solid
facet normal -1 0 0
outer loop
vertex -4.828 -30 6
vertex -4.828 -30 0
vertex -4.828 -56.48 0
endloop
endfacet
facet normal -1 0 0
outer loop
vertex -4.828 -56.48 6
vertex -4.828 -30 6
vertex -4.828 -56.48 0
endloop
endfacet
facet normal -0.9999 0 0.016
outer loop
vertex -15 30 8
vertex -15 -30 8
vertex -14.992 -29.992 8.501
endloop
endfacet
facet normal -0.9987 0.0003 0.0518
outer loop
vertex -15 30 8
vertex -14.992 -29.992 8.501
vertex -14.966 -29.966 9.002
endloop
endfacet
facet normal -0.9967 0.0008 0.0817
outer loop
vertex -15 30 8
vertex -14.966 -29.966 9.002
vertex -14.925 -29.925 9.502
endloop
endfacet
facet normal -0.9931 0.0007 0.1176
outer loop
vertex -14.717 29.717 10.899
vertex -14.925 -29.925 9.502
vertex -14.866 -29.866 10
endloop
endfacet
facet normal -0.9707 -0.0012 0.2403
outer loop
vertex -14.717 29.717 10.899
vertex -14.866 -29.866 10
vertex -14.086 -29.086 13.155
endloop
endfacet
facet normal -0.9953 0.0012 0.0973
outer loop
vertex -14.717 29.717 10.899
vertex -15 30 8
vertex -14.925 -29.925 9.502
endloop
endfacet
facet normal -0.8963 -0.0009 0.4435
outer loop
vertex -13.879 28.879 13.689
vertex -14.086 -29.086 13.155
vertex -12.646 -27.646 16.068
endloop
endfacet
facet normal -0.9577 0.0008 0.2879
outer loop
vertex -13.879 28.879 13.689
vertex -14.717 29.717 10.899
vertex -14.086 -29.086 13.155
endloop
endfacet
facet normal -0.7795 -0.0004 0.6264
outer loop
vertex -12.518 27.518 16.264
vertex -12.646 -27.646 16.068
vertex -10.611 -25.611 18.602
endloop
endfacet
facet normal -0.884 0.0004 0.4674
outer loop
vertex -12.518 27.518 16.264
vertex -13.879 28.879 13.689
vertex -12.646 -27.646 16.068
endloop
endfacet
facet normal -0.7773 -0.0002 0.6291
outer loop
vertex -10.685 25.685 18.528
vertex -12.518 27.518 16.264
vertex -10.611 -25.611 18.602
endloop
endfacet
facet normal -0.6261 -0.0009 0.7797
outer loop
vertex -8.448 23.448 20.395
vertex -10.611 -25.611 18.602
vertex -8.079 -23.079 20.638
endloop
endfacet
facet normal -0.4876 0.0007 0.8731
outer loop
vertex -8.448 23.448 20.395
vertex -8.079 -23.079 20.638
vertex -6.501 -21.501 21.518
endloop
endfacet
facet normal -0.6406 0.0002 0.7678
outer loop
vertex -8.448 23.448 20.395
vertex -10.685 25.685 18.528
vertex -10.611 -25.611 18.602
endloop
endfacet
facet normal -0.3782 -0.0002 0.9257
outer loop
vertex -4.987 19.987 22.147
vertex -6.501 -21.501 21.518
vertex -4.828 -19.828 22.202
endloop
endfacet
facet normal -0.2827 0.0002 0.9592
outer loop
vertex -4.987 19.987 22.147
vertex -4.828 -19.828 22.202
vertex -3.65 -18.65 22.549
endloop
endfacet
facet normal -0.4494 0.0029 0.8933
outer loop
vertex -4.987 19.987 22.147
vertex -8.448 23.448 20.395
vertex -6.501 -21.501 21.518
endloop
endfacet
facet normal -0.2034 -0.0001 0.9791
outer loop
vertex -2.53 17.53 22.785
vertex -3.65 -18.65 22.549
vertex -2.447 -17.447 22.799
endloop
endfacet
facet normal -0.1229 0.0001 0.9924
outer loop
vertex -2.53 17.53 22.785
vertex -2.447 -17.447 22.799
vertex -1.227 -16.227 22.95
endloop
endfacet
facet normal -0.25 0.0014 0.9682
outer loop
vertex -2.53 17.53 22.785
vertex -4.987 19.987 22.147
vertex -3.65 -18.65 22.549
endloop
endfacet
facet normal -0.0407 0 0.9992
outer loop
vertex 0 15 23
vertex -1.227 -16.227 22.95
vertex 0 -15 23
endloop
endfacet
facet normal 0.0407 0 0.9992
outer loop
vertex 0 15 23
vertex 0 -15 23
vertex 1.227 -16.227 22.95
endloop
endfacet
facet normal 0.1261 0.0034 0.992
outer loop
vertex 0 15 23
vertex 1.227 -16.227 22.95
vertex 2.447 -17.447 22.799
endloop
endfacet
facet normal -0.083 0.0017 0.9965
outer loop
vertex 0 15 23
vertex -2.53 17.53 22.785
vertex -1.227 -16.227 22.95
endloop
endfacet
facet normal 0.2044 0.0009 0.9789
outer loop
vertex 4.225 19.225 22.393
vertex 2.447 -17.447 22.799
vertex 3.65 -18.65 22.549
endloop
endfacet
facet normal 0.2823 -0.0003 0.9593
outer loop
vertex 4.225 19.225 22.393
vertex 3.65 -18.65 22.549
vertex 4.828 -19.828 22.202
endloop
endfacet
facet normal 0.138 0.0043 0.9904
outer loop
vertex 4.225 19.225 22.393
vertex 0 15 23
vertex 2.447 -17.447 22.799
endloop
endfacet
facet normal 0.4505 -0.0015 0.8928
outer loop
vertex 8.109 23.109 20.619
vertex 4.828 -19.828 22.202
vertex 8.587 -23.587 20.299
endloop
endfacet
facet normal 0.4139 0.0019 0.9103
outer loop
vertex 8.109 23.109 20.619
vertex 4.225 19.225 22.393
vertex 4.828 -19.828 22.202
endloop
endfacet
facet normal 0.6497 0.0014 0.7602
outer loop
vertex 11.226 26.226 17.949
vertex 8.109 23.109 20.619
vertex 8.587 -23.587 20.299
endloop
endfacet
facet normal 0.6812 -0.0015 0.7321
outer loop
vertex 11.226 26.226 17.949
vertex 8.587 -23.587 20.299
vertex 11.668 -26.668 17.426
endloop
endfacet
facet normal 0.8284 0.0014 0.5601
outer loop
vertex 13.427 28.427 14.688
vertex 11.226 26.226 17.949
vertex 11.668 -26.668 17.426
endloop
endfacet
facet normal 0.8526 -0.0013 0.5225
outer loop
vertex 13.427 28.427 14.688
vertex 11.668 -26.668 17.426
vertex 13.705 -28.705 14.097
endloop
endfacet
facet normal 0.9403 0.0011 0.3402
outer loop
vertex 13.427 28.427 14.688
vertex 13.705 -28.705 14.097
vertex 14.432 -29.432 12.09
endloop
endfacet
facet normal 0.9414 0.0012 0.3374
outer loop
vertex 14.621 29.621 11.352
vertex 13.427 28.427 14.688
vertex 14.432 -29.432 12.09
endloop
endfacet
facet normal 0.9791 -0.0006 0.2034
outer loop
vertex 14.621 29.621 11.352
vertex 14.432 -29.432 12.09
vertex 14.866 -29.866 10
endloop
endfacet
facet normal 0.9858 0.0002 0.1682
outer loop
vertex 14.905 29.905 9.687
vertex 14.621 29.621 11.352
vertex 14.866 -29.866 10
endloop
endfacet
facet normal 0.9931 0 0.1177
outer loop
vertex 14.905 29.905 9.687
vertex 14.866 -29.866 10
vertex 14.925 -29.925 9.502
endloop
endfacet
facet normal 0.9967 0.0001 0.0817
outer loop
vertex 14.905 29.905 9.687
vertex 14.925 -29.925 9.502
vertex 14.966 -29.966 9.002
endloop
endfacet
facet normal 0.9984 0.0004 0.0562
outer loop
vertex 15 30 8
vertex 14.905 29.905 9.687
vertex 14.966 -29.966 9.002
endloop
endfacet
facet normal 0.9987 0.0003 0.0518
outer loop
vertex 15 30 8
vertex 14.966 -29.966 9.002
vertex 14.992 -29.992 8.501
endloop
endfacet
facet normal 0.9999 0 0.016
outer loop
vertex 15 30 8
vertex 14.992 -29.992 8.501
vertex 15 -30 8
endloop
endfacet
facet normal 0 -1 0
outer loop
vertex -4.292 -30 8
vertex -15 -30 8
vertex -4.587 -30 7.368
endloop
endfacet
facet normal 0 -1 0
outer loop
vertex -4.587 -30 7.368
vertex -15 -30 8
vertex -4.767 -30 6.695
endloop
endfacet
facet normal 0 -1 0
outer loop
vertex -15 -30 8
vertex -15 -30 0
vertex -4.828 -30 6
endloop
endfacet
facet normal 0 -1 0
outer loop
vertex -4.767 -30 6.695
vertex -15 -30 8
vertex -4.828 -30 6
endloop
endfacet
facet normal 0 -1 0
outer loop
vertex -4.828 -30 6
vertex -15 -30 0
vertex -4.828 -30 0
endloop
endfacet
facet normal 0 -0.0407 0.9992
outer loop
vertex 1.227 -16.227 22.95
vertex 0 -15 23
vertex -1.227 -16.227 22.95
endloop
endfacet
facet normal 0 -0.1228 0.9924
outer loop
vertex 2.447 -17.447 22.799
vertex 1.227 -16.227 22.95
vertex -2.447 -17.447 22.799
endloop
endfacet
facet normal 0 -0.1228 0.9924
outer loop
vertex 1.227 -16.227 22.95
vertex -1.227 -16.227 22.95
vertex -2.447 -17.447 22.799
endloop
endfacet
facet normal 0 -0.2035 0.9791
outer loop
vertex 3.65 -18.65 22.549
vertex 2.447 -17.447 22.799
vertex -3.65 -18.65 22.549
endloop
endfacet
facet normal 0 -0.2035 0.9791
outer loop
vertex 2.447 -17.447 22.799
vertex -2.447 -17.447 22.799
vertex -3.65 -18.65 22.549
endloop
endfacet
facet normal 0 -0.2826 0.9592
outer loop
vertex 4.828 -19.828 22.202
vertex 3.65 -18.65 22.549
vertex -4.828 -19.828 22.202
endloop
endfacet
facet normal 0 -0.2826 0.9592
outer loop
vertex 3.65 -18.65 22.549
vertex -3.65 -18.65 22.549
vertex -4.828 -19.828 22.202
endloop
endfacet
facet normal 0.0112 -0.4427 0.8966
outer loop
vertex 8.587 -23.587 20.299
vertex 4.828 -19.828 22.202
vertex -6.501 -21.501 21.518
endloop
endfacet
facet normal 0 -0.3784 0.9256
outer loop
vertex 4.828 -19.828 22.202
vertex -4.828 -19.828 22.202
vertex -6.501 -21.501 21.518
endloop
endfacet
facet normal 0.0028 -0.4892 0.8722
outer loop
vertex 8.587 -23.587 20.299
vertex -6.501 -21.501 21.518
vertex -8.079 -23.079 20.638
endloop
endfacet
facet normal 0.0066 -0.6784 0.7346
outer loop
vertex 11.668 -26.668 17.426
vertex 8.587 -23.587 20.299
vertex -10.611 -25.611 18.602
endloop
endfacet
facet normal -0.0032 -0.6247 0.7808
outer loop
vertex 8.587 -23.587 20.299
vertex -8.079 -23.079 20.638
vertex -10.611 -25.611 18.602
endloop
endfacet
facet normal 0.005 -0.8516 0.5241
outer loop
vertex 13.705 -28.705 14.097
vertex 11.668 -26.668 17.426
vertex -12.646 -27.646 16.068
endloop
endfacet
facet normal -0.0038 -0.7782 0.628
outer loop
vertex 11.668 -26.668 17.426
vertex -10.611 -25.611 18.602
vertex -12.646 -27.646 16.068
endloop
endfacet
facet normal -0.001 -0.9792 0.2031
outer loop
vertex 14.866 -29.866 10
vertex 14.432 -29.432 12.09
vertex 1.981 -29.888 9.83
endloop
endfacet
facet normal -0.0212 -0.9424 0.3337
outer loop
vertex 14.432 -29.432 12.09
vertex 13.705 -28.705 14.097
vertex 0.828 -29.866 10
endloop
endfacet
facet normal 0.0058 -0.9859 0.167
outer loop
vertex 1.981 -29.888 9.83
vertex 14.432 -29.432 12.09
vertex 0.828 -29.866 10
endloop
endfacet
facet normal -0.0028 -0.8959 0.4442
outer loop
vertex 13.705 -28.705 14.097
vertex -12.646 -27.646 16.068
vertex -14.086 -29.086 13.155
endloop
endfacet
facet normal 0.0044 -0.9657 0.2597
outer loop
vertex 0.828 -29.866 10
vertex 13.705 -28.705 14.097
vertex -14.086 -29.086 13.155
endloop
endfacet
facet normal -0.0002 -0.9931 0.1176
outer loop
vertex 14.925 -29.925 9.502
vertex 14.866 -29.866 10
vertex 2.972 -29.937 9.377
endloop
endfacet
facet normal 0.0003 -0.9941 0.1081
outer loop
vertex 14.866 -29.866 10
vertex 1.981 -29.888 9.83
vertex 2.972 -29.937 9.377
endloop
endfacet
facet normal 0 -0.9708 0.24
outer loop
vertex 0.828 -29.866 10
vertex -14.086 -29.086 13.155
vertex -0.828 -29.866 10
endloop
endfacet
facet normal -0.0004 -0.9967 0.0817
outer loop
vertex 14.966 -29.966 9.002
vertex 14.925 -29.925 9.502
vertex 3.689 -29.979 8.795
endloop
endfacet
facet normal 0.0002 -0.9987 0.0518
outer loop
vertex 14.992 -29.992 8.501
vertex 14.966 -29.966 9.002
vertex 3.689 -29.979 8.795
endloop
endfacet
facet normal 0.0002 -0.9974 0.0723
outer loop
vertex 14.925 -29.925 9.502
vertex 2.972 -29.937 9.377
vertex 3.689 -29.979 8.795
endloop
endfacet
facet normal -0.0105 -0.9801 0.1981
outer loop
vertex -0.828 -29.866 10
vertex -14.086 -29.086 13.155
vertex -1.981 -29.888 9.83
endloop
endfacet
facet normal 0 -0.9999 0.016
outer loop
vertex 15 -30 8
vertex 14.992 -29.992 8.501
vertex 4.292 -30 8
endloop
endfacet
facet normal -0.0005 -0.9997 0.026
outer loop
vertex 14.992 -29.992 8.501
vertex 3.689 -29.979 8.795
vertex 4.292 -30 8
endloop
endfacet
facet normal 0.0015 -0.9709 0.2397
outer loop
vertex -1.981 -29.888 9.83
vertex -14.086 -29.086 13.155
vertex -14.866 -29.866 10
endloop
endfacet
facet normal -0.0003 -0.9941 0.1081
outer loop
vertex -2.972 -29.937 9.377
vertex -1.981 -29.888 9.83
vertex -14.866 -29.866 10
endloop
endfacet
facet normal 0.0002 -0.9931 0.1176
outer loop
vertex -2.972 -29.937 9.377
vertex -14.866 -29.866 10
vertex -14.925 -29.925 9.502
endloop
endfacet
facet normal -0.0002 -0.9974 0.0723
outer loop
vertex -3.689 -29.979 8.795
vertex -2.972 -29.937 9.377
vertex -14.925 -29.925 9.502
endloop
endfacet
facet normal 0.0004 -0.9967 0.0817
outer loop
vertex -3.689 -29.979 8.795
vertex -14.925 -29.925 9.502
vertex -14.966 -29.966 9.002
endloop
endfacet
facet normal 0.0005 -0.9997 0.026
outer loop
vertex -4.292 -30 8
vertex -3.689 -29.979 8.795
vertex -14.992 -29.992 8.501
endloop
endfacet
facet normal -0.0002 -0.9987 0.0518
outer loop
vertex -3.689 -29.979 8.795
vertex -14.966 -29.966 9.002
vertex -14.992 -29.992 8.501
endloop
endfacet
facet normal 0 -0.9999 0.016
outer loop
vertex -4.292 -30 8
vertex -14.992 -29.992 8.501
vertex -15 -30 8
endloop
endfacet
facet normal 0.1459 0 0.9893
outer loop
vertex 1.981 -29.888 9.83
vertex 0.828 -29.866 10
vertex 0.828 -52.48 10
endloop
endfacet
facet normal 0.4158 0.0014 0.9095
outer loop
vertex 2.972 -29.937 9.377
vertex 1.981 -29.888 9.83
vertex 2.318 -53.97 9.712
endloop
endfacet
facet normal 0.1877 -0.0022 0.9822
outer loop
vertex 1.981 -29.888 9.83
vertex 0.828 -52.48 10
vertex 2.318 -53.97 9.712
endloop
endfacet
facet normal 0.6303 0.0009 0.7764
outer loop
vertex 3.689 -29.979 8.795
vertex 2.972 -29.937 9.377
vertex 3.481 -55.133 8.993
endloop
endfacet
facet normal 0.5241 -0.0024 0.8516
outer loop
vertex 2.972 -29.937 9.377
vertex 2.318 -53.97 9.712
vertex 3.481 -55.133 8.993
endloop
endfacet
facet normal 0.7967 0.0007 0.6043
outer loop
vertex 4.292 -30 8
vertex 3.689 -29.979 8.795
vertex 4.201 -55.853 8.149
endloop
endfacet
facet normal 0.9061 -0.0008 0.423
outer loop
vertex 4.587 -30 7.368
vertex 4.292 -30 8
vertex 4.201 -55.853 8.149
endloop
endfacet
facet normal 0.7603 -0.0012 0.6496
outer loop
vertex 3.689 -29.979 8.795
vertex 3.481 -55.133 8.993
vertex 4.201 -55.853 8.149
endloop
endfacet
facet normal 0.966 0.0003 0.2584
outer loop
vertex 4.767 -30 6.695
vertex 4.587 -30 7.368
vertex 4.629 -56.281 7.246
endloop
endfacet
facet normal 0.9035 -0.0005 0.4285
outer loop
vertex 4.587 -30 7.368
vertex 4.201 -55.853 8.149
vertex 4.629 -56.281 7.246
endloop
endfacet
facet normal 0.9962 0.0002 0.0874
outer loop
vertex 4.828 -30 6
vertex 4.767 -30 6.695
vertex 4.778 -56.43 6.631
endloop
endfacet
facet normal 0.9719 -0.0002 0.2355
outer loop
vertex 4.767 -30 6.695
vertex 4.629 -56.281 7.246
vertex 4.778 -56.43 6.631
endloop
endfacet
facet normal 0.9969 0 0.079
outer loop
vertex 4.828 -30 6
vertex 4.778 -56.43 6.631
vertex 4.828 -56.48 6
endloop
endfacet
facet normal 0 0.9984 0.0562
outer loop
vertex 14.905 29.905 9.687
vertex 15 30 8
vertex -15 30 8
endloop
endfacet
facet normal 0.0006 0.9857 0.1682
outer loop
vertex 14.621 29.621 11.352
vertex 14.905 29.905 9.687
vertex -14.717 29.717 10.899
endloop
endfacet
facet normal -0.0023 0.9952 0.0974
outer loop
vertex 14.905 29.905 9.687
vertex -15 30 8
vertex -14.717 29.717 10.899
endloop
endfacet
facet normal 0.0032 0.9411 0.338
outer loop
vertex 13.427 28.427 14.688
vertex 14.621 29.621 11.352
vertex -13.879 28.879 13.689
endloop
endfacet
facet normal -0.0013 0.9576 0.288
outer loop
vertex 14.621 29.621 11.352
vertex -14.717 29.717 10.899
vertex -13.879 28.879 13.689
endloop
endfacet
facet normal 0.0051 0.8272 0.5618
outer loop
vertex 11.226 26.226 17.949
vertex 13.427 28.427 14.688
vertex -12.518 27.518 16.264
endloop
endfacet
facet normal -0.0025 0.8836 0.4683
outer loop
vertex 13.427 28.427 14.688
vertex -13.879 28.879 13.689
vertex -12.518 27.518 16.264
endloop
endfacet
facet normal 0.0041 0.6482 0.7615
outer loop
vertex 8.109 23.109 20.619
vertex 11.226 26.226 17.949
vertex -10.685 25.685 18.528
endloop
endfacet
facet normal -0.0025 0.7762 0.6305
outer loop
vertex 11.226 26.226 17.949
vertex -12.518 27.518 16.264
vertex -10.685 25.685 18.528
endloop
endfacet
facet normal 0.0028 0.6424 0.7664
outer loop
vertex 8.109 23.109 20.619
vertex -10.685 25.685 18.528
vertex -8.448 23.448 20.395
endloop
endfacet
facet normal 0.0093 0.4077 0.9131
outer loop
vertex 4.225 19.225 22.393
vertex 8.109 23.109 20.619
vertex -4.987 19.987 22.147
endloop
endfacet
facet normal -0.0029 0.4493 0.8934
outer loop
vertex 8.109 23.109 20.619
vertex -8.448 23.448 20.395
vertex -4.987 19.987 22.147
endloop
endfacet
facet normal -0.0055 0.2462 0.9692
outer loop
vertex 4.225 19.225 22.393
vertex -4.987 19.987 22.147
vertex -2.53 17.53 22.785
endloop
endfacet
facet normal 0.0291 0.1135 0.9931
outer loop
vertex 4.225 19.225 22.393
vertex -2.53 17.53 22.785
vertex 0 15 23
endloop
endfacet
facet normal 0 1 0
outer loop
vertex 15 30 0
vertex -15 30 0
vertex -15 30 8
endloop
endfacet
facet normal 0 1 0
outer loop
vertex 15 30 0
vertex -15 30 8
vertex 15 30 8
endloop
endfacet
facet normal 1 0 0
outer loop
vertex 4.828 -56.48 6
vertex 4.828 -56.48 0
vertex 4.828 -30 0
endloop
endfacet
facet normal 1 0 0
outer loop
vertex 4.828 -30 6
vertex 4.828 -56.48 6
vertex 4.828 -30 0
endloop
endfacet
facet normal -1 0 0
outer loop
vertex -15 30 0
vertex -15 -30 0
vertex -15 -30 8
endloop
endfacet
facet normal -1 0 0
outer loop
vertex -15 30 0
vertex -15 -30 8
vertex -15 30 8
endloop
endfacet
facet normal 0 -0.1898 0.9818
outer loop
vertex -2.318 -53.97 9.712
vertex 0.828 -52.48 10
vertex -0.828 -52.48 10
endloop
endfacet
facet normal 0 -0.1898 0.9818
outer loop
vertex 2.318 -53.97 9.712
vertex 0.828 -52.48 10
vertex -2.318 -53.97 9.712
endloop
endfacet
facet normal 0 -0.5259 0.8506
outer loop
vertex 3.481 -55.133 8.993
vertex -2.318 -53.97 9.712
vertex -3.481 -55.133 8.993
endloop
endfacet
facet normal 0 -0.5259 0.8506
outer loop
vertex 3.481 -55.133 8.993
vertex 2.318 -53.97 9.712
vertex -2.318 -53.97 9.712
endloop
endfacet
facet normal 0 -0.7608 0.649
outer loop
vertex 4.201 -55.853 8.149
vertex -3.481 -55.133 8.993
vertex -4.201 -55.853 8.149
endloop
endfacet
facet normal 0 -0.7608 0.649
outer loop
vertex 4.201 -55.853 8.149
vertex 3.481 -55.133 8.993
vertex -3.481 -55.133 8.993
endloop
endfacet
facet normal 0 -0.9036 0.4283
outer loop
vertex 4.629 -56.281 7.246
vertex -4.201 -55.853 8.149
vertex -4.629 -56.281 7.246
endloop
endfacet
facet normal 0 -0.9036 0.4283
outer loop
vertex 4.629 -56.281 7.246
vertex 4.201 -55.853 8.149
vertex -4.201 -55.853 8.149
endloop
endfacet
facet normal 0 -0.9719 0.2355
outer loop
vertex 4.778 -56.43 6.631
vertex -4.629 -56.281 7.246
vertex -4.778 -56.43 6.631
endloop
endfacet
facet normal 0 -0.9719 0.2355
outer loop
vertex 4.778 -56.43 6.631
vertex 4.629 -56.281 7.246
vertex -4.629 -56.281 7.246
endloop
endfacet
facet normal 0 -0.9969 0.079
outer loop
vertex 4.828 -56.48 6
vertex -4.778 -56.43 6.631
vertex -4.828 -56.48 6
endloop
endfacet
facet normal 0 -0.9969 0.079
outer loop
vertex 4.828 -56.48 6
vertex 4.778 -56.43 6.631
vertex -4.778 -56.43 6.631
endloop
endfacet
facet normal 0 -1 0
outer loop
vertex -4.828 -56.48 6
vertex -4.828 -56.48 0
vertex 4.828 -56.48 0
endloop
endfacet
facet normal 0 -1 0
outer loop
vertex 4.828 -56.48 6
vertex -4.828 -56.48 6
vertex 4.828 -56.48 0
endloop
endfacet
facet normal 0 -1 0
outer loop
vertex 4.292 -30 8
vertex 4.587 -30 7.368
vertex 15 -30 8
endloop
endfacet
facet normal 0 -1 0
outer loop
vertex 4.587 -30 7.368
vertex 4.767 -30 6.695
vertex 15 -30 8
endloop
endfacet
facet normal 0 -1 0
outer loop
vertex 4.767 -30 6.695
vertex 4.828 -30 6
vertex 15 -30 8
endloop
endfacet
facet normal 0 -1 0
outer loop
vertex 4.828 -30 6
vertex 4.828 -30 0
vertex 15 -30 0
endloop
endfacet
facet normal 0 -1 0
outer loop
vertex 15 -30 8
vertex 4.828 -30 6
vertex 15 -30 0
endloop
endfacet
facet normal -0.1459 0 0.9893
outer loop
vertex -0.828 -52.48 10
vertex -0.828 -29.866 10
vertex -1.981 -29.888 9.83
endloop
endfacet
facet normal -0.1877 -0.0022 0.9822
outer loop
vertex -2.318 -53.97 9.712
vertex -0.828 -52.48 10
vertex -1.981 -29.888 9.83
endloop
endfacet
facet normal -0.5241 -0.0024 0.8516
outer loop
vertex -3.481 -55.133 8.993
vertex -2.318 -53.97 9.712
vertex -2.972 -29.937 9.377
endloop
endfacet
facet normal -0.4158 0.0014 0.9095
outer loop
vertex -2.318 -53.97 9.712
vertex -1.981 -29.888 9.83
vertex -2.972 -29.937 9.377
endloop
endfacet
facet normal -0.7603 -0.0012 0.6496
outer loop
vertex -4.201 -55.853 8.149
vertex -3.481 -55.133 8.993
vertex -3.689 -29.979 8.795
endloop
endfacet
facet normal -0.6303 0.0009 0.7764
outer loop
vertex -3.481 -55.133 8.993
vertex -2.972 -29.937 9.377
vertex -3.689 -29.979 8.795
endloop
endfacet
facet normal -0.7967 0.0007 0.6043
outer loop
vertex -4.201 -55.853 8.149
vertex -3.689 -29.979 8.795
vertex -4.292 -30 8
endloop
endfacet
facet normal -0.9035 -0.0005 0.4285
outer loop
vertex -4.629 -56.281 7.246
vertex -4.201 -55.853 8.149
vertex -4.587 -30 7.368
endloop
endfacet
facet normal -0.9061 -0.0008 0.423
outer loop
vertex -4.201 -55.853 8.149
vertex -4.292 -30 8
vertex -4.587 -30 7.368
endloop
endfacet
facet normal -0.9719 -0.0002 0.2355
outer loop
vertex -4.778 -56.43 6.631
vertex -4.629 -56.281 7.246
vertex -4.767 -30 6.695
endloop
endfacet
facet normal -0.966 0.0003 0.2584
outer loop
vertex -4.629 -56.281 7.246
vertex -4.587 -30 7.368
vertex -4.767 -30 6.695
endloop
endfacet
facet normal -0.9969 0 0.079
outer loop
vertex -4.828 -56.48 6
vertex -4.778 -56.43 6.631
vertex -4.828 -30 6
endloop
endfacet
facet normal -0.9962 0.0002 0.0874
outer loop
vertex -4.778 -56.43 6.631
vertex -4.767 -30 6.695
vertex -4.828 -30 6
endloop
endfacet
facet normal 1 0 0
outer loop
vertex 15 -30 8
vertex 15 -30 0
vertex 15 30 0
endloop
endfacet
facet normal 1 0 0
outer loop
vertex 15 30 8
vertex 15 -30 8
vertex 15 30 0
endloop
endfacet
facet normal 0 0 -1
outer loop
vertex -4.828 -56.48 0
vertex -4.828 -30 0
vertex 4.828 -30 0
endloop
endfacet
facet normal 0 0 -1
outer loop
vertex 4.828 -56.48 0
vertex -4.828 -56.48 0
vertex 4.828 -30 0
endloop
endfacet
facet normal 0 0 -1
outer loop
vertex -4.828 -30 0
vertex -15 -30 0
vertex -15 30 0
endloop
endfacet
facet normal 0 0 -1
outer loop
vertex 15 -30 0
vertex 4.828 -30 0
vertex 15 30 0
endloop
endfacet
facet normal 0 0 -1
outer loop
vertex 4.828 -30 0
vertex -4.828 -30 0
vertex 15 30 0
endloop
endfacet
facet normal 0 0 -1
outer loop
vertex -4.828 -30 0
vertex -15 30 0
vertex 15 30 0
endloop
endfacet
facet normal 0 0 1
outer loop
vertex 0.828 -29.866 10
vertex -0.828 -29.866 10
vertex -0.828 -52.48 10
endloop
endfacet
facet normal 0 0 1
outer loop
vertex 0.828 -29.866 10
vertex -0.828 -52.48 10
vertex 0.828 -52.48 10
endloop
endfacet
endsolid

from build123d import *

# Parameters (mm, degrees)
F0_W         = 30
F0_H         = 60
F2_DEPTH     = 23
F3_DEPTH     = 10
F4_T1_DEPTH  = 135
F4_T3_DEPTH  = 105
F4_T8_DEPTH  = 105
F4_T14_DEPTH = 105
F4_T20_DEPTH = 105
F4_T27_DEPTH = 105
F4_T33_DEPTH = 105
F5_R         = 4


# Not quite as in the source:
# - a fillet or chamfer that OpenCascade refuses, or shapes differently, is made with other operations: its cross-section is extruded or revolved along the edge and cut away or added


with BuildPart() as f2:
    # F0 (on Top) → F2 (new body)
    with BuildSketch(Plane.XY):
        Rectangle(F0_W, F0_H)
    extrude(amount=F2_DEPTH)

    # F1 (on face) → F3 (join)
    with BuildSketch(Plane.XY):
        Polygon((4.8278798349, -30), (-4.8278798349, -30), (-4.8278798349, -56.4796291292), (0, -56.4796291292), (4.8278798349, -56.4796291292), align=None)
    extrude(amount=F3_DEPTH)

    # F4: fillet of radius 15 on 4 edges, made by hand

    # F4_s2 → F4_t1 (cut)
    with BuildSketch(Plane.XZ.offset(-67.5)):
        with BuildLine():
            ThreePointArc((-15, 8), (-10.6066017178, 18.6066017178), (0, 23))
            Line((0, 23), (-15, 23))
            Line((-15, 23), (-15, 8))
        make_face()
        with BuildLine():
            ThreePointArc((15, 8), (10.6066017178, 18.6066017178), (0, 23))
            Line((0, 23), (15, 23))
            Line((15, 23), (15, 8))
        make_face()
    extrude(amount=F4_T1_DEPTH, mode=Mode.SUBTRACT)

    # F4_s4 → F4_t3 (cut)
    with BuildSketch(Plane.YZ.offset(-52.5)):
        with BuildLine():
            ThreePointArc((30, 8), (25.6066017178, 18.6066017178), (15, 23))
            Line((15, 23), (30, 23))
            Line((30, 23), (30, 8))
        make_face()
    extrude(amount=F4_T3_DEPTH, mode=Mode.SUBTRACT)


with BuildPart() as f4_tool6:
    # F4_s7 → F4_t8 (new body)
    with BuildSketch(Plane.YZ.offset(-52.5)):
        with BuildLine():
            ThreePointArc((-15, 23), (-25.6066017178, 18.6066017178), (-30, 8))
            Line((-30, 8), (-30, 23))
            Line((-30, 23), (-15, 23))
        make_face()
    extrude(amount=F4_T8_DEPTH)

    split(bisect_by=Plane.YZ.offset(-4.8278798349), keep=Keep.BOTTOM)

    split(bisect_by=Plane.XY.offset(10), keep=Keep.TOP)


with BuildPart() as f2_1:
    add(f2.part)

    # F4_t5: cut F4_tool6
    add(f4_tool6.part, mode=Mode.SUBTRACT)


with BuildPart() as f4_tool12:
    # F4_s13 → F4_t14 (new body)
    with BuildSketch(Plane.YZ.offset(-52.5)):
        with BuildLine():
            ThreePointArc((-15, 23), (-25.6066017178, 18.6066017178), (-30, 8))
            Line((-30, 8), (-30, 23))
            Line((-30, 23), (-15, 23))
        make_face()
    extrude(amount=F4_T14_DEPTH)

    split(bisect_by=Plane.YZ.offset(-4.8278798349), keep=Keep.BOTTOM)

    split(bisect_by=Plane.XY.offset(10), keep=Keep.BOTTOM)


with BuildPart() as f2_2:
    add(f2_1.part)

    # F4_t11: cut F4_tool12
    add(f4_tool12.part, mode=Mode.SUBTRACT)


with BuildPart() as f4_tool18:
    # F4_s19 → F4_t20 (new body)
    with BuildSketch(Plane.YZ.offset(-52.5)):
        with BuildLine():
            ThreePointArc((-15, 23), (-25.6066017178, 18.6066017178), (-30, 8))
            Line((-30, 8), (-30, 23))
            Line((-30, 23), (-15, 23))
        make_face()
    extrude(amount=F4_T20_DEPTH)

    split(bisect_by=Plane.YZ.offset(-4.8278798349), keep=Keep.TOP)

    split(bisect_by=Plane.XY.offset(10), keep=Keep.TOP)

    split(bisect_by=Plane.YZ.offset(4.8278798349), keep=Keep.BOTTOM)


with BuildPart() as f2_3:
    add(f2_2.part)

    # F4_t17: cut F4_tool18
    add(f4_tool18.part, mode=Mode.SUBTRACT)


with BuildPart() as f4_tool25:
    # F4_s26 → F4_t27 (new body)
    with BuildSketch(Plane.YZ.offset(-52.5)):
        with BuildLine():
            ThreePointArc((-15, 23), (-25.6066017178, 18.6066017178), (-30, 8))
            Line((-30, 8), (-30, 23))
            Line((-30, 23), (-15, 23))
        make_face()
    extrude(amount=F4_T27_DEPTH)

    split(bisect_by=Plane.XY.offset(10), keep=Keep.TOP)

    split(bisect_by=Plane.YZ.offset(4.8278798349), keep=Keep.TOP)


with BuildPart() as f2_4:
    add(f2_3.part)

    # F4_t24: cut F4_tool25
    add(f4_tool25.part, mode=Mode.SUBTRACT)


with BuildPart() as f4_tool31:
    # F4_s32 → F4_t33 (new body)
    with BuildSketch(Plane.YZ.offset(-52.5)):
        with BuildLine():
            ThreePointArc((-15, 23), (-25.6066017178, 18.6066017178), (-30, 8))
            Line((-30, 8), (-30, 23))
            Line((-30, 23), (-15, 23))
        make_face()
    extrude(amount=F4_T33_DEPTH)

    split(bisect_by=Plane.XY.offset(10), keep=Keep.BOTTOM)

    split(bisect_by=Plane.YZ.offset(4.8278798349), keep=Keep.TOP)


with BuildPart() as f2_5:
    add(f2_4.part)

    # F4_t30: cut F4_tool31
    add(f4_tool31.part, mode=Mode.SUBTRACT)

    # F5
    f5_edges = [f2_5.edges().sort_by_distance(p)[0] for p in [
        (-4.82788, -43.172849, 10),
        (4.82788, -43.172849, 10),
        (0, -56.479629, 10),
    ]]
    fillet(f5_edges, radius=F5_R)


solid = f2_5.part
